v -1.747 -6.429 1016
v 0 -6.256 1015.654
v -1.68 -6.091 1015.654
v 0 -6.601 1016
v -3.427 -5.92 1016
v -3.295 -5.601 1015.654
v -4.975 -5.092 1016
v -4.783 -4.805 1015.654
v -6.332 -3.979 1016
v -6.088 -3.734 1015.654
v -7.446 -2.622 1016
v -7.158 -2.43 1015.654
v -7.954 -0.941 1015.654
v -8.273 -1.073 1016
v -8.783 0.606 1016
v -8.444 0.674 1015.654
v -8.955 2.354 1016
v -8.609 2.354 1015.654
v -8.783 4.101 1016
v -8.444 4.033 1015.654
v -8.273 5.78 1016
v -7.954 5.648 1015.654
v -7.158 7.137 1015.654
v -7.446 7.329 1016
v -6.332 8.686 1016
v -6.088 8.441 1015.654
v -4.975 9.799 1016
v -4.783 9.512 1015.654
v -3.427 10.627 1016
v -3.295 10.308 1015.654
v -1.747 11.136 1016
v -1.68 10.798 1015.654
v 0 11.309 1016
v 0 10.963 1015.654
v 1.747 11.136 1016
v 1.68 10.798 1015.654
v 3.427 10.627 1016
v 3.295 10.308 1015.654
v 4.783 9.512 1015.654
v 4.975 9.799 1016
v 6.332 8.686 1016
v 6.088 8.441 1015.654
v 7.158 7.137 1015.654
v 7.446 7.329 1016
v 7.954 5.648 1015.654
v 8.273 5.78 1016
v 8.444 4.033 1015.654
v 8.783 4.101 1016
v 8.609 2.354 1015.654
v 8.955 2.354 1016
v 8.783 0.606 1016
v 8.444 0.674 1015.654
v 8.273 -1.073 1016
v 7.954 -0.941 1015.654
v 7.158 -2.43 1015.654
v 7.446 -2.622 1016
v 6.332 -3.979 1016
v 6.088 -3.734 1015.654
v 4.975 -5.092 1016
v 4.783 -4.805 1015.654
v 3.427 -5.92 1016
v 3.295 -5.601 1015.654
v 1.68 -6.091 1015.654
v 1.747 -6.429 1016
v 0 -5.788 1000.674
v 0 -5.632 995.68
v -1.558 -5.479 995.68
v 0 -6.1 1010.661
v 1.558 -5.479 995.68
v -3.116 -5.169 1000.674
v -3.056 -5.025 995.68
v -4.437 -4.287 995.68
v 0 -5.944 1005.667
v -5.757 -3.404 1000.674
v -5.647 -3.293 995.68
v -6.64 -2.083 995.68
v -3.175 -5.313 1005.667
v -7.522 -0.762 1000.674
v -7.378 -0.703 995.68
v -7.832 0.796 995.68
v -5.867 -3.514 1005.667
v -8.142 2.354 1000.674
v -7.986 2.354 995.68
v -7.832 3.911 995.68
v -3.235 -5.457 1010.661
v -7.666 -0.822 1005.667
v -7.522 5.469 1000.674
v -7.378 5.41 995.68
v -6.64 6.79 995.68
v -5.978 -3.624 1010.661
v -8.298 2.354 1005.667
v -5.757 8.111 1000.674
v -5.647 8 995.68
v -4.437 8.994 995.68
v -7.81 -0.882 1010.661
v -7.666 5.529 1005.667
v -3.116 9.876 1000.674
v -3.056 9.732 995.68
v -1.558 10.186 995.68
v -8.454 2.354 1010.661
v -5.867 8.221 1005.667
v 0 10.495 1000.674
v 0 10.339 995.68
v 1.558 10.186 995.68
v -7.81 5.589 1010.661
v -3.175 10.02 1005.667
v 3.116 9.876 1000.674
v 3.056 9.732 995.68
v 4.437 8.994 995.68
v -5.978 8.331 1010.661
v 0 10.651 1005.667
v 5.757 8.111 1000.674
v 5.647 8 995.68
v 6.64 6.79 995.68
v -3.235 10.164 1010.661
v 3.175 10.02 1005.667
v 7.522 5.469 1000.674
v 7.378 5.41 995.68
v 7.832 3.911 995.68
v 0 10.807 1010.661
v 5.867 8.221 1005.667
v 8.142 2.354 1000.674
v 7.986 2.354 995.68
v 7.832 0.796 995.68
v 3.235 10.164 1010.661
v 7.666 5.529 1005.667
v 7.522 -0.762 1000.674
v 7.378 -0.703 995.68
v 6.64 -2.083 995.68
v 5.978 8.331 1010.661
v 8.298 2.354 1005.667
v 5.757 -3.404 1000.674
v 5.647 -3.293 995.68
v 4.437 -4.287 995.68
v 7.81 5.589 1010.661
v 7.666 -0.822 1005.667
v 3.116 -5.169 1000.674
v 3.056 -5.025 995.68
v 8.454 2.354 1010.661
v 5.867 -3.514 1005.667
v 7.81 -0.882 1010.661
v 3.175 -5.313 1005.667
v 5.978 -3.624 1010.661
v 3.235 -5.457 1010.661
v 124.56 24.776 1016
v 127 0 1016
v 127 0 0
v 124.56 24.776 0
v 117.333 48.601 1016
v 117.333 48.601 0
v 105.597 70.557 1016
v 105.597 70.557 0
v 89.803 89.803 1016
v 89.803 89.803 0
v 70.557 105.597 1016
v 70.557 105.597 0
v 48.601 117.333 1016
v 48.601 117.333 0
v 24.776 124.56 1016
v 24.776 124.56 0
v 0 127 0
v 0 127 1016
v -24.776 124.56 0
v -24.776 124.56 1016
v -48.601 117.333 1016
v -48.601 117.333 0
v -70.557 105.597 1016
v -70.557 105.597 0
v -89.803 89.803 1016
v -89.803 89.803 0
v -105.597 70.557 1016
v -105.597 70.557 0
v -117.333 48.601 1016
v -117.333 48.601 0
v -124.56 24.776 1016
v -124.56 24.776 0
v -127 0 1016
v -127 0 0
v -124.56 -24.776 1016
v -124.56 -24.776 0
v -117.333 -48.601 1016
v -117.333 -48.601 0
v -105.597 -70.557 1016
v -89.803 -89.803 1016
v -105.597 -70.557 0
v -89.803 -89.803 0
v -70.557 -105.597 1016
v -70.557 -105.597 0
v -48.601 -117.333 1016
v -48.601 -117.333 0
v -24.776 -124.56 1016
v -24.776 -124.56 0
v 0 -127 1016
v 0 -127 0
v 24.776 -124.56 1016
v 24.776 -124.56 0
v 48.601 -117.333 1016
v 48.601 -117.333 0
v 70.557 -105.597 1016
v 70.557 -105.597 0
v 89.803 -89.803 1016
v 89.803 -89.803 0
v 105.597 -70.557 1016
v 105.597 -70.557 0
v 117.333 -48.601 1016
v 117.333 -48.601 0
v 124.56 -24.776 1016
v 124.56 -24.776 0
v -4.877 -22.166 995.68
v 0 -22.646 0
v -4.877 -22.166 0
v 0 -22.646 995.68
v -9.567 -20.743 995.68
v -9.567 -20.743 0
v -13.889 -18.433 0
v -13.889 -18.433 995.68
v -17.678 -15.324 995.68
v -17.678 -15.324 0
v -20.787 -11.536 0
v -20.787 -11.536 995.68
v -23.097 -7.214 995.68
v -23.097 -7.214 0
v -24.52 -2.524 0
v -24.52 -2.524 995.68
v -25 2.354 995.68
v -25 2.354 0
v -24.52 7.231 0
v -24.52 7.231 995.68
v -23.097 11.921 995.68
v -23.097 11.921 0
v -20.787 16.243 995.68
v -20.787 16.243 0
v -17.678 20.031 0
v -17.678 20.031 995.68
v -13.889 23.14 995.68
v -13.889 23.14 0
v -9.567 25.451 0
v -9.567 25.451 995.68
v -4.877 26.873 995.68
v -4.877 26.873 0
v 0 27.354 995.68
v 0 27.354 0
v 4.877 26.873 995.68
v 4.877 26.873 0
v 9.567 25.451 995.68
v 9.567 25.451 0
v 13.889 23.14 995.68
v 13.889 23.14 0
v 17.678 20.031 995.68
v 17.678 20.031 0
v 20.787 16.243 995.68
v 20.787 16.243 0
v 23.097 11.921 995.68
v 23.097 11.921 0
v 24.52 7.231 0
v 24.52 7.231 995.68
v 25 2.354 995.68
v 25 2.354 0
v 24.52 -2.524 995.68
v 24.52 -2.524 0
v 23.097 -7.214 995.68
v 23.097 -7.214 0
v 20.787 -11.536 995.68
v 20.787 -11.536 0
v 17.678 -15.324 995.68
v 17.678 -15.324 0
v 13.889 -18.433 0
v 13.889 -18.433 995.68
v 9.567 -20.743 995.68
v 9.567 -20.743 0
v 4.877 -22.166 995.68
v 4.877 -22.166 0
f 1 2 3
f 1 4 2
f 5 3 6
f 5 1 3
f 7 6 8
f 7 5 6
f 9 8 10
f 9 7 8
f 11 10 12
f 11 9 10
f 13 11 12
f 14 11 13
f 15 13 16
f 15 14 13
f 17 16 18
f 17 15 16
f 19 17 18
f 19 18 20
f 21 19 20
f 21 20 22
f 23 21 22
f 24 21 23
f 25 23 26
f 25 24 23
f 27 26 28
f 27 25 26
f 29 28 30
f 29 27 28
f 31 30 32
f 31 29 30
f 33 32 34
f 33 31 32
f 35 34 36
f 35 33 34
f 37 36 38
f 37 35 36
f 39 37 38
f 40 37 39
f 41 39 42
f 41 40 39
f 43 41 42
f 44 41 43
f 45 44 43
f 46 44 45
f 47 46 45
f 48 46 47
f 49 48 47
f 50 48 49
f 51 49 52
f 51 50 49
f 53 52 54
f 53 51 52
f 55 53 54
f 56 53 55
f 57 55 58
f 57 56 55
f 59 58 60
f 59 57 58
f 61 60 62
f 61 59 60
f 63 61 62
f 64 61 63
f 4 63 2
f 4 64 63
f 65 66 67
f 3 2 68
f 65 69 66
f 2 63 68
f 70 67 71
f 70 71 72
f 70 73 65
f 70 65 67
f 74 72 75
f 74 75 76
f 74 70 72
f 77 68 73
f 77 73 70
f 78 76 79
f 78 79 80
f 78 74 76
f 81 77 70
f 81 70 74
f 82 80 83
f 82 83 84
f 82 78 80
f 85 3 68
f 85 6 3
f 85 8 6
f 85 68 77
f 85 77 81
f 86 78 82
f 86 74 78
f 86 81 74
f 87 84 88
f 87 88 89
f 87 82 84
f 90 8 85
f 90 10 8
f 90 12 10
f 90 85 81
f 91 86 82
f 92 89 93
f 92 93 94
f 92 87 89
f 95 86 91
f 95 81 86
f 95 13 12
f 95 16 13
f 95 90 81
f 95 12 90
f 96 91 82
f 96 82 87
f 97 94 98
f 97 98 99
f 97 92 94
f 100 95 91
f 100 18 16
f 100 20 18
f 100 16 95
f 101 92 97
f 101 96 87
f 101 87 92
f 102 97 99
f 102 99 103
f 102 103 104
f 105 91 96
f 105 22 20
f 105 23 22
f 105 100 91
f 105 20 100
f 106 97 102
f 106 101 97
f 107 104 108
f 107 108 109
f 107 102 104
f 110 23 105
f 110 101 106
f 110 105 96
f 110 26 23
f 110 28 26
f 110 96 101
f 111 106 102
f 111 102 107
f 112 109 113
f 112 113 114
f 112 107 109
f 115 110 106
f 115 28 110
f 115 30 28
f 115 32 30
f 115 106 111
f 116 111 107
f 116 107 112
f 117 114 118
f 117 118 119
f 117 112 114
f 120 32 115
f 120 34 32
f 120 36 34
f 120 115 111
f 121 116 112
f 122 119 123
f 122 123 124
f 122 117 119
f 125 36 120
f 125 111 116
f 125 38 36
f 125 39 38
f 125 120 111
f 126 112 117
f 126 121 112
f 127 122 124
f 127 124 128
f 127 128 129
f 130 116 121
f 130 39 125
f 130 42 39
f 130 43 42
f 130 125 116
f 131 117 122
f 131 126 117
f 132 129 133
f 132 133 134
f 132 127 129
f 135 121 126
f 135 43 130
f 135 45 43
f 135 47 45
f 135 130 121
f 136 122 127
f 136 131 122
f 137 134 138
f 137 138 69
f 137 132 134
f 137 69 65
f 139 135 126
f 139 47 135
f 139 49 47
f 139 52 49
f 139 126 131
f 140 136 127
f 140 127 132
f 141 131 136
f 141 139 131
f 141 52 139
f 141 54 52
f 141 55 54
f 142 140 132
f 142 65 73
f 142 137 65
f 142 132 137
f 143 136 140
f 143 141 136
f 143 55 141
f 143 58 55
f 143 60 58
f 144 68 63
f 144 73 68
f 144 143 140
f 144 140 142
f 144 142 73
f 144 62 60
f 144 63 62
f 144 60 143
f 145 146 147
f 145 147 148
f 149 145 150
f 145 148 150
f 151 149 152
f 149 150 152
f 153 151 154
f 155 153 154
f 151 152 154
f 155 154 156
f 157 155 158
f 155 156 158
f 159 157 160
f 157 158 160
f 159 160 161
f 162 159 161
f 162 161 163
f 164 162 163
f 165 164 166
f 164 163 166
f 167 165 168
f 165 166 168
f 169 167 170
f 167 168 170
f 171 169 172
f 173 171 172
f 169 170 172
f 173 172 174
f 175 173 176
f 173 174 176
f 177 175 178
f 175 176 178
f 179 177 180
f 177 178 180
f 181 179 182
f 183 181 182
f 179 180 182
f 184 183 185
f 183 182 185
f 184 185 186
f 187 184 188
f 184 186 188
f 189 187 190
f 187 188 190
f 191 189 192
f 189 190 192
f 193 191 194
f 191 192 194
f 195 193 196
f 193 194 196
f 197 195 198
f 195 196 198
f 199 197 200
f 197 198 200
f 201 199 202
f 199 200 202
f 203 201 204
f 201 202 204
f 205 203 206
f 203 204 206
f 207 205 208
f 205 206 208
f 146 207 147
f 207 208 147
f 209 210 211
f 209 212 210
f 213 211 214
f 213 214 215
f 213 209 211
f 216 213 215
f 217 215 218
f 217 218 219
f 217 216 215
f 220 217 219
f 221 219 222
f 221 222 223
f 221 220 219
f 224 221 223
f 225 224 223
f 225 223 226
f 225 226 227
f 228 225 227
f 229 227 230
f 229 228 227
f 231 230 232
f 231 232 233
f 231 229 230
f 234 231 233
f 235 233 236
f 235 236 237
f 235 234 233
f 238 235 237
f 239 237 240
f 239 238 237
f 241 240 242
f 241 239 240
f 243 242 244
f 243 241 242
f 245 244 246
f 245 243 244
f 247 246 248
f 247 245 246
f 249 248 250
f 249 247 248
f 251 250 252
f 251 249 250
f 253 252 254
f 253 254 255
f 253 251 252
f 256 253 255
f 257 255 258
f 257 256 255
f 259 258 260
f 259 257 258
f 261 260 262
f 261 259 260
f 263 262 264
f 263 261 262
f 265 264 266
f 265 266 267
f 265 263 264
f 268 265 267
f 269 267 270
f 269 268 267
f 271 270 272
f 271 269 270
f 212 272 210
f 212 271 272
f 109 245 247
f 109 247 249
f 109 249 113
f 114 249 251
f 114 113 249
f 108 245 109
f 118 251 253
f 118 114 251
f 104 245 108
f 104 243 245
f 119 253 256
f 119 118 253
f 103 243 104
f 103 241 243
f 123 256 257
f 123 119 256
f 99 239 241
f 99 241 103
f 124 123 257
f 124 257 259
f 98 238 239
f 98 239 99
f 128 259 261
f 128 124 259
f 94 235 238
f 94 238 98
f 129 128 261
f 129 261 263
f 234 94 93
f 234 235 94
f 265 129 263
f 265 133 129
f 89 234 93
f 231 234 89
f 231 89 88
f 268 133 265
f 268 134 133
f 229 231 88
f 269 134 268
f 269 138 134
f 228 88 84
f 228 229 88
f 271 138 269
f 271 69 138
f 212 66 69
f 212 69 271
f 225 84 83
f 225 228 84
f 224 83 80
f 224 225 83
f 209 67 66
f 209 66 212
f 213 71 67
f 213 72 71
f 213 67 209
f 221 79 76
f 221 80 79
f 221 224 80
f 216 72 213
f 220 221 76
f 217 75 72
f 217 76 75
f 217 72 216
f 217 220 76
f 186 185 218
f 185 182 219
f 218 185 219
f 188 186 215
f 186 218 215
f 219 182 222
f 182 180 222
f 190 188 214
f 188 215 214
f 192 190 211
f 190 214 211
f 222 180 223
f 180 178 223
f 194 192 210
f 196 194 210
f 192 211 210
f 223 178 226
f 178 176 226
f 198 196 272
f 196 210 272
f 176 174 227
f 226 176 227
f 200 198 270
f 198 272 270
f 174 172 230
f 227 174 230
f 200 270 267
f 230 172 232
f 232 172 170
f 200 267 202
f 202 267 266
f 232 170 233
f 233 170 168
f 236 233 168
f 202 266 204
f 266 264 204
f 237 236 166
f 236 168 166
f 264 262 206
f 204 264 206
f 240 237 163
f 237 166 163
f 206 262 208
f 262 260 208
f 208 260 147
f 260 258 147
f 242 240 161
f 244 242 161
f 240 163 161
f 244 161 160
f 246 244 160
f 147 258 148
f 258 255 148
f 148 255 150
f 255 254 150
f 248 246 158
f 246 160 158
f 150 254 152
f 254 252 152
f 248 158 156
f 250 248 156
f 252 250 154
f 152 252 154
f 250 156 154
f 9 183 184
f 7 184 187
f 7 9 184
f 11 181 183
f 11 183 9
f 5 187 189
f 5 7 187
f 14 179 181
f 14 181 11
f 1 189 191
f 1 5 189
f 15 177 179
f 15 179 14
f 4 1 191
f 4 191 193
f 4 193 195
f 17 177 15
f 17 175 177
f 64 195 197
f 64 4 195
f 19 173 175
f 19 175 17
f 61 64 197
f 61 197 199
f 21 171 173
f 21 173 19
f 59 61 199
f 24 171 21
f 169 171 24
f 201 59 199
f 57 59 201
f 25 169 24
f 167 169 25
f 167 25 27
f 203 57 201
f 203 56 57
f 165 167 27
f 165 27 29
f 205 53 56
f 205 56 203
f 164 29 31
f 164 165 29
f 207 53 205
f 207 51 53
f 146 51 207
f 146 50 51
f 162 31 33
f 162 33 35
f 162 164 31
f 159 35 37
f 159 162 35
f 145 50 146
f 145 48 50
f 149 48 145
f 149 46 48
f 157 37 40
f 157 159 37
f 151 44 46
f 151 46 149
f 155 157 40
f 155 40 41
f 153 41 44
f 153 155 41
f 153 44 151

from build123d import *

# Parameters (mm, degrees)
SKETCH1_R           = 127
BOSS_EXTRUDE1_DEPTH = 1016


with BuildPart() as part:
    # Sketch1 → Boss-Extrude1 (new body)
    with BuildSketch(Plane.XY):
        Circle(SKETCH1_R)
    extrude(amount=BOSS_EXTRUDE1_DEPTH)

    # Sketch6 → 3/8 Rc Tapped Hole2 (revolve, cut)
    with BuildSketch(Plane(origin=(0, 2.353512808, 1016), x_dir=(0, -1, 0), z_dir=(1, 0, 0))):
        Polygon((0, 0), (0, 1016), (25, 1016), (25, 20.32), (7.985917585, 20.32), (8.6094525, 0.3455475), (8.955, 0), align=None)
    revolve(axis=Axis((0, 2.353512808, 1022.35), (0, 0, -1)), mode=Mode.SUBTRACT)


solid = part.part
